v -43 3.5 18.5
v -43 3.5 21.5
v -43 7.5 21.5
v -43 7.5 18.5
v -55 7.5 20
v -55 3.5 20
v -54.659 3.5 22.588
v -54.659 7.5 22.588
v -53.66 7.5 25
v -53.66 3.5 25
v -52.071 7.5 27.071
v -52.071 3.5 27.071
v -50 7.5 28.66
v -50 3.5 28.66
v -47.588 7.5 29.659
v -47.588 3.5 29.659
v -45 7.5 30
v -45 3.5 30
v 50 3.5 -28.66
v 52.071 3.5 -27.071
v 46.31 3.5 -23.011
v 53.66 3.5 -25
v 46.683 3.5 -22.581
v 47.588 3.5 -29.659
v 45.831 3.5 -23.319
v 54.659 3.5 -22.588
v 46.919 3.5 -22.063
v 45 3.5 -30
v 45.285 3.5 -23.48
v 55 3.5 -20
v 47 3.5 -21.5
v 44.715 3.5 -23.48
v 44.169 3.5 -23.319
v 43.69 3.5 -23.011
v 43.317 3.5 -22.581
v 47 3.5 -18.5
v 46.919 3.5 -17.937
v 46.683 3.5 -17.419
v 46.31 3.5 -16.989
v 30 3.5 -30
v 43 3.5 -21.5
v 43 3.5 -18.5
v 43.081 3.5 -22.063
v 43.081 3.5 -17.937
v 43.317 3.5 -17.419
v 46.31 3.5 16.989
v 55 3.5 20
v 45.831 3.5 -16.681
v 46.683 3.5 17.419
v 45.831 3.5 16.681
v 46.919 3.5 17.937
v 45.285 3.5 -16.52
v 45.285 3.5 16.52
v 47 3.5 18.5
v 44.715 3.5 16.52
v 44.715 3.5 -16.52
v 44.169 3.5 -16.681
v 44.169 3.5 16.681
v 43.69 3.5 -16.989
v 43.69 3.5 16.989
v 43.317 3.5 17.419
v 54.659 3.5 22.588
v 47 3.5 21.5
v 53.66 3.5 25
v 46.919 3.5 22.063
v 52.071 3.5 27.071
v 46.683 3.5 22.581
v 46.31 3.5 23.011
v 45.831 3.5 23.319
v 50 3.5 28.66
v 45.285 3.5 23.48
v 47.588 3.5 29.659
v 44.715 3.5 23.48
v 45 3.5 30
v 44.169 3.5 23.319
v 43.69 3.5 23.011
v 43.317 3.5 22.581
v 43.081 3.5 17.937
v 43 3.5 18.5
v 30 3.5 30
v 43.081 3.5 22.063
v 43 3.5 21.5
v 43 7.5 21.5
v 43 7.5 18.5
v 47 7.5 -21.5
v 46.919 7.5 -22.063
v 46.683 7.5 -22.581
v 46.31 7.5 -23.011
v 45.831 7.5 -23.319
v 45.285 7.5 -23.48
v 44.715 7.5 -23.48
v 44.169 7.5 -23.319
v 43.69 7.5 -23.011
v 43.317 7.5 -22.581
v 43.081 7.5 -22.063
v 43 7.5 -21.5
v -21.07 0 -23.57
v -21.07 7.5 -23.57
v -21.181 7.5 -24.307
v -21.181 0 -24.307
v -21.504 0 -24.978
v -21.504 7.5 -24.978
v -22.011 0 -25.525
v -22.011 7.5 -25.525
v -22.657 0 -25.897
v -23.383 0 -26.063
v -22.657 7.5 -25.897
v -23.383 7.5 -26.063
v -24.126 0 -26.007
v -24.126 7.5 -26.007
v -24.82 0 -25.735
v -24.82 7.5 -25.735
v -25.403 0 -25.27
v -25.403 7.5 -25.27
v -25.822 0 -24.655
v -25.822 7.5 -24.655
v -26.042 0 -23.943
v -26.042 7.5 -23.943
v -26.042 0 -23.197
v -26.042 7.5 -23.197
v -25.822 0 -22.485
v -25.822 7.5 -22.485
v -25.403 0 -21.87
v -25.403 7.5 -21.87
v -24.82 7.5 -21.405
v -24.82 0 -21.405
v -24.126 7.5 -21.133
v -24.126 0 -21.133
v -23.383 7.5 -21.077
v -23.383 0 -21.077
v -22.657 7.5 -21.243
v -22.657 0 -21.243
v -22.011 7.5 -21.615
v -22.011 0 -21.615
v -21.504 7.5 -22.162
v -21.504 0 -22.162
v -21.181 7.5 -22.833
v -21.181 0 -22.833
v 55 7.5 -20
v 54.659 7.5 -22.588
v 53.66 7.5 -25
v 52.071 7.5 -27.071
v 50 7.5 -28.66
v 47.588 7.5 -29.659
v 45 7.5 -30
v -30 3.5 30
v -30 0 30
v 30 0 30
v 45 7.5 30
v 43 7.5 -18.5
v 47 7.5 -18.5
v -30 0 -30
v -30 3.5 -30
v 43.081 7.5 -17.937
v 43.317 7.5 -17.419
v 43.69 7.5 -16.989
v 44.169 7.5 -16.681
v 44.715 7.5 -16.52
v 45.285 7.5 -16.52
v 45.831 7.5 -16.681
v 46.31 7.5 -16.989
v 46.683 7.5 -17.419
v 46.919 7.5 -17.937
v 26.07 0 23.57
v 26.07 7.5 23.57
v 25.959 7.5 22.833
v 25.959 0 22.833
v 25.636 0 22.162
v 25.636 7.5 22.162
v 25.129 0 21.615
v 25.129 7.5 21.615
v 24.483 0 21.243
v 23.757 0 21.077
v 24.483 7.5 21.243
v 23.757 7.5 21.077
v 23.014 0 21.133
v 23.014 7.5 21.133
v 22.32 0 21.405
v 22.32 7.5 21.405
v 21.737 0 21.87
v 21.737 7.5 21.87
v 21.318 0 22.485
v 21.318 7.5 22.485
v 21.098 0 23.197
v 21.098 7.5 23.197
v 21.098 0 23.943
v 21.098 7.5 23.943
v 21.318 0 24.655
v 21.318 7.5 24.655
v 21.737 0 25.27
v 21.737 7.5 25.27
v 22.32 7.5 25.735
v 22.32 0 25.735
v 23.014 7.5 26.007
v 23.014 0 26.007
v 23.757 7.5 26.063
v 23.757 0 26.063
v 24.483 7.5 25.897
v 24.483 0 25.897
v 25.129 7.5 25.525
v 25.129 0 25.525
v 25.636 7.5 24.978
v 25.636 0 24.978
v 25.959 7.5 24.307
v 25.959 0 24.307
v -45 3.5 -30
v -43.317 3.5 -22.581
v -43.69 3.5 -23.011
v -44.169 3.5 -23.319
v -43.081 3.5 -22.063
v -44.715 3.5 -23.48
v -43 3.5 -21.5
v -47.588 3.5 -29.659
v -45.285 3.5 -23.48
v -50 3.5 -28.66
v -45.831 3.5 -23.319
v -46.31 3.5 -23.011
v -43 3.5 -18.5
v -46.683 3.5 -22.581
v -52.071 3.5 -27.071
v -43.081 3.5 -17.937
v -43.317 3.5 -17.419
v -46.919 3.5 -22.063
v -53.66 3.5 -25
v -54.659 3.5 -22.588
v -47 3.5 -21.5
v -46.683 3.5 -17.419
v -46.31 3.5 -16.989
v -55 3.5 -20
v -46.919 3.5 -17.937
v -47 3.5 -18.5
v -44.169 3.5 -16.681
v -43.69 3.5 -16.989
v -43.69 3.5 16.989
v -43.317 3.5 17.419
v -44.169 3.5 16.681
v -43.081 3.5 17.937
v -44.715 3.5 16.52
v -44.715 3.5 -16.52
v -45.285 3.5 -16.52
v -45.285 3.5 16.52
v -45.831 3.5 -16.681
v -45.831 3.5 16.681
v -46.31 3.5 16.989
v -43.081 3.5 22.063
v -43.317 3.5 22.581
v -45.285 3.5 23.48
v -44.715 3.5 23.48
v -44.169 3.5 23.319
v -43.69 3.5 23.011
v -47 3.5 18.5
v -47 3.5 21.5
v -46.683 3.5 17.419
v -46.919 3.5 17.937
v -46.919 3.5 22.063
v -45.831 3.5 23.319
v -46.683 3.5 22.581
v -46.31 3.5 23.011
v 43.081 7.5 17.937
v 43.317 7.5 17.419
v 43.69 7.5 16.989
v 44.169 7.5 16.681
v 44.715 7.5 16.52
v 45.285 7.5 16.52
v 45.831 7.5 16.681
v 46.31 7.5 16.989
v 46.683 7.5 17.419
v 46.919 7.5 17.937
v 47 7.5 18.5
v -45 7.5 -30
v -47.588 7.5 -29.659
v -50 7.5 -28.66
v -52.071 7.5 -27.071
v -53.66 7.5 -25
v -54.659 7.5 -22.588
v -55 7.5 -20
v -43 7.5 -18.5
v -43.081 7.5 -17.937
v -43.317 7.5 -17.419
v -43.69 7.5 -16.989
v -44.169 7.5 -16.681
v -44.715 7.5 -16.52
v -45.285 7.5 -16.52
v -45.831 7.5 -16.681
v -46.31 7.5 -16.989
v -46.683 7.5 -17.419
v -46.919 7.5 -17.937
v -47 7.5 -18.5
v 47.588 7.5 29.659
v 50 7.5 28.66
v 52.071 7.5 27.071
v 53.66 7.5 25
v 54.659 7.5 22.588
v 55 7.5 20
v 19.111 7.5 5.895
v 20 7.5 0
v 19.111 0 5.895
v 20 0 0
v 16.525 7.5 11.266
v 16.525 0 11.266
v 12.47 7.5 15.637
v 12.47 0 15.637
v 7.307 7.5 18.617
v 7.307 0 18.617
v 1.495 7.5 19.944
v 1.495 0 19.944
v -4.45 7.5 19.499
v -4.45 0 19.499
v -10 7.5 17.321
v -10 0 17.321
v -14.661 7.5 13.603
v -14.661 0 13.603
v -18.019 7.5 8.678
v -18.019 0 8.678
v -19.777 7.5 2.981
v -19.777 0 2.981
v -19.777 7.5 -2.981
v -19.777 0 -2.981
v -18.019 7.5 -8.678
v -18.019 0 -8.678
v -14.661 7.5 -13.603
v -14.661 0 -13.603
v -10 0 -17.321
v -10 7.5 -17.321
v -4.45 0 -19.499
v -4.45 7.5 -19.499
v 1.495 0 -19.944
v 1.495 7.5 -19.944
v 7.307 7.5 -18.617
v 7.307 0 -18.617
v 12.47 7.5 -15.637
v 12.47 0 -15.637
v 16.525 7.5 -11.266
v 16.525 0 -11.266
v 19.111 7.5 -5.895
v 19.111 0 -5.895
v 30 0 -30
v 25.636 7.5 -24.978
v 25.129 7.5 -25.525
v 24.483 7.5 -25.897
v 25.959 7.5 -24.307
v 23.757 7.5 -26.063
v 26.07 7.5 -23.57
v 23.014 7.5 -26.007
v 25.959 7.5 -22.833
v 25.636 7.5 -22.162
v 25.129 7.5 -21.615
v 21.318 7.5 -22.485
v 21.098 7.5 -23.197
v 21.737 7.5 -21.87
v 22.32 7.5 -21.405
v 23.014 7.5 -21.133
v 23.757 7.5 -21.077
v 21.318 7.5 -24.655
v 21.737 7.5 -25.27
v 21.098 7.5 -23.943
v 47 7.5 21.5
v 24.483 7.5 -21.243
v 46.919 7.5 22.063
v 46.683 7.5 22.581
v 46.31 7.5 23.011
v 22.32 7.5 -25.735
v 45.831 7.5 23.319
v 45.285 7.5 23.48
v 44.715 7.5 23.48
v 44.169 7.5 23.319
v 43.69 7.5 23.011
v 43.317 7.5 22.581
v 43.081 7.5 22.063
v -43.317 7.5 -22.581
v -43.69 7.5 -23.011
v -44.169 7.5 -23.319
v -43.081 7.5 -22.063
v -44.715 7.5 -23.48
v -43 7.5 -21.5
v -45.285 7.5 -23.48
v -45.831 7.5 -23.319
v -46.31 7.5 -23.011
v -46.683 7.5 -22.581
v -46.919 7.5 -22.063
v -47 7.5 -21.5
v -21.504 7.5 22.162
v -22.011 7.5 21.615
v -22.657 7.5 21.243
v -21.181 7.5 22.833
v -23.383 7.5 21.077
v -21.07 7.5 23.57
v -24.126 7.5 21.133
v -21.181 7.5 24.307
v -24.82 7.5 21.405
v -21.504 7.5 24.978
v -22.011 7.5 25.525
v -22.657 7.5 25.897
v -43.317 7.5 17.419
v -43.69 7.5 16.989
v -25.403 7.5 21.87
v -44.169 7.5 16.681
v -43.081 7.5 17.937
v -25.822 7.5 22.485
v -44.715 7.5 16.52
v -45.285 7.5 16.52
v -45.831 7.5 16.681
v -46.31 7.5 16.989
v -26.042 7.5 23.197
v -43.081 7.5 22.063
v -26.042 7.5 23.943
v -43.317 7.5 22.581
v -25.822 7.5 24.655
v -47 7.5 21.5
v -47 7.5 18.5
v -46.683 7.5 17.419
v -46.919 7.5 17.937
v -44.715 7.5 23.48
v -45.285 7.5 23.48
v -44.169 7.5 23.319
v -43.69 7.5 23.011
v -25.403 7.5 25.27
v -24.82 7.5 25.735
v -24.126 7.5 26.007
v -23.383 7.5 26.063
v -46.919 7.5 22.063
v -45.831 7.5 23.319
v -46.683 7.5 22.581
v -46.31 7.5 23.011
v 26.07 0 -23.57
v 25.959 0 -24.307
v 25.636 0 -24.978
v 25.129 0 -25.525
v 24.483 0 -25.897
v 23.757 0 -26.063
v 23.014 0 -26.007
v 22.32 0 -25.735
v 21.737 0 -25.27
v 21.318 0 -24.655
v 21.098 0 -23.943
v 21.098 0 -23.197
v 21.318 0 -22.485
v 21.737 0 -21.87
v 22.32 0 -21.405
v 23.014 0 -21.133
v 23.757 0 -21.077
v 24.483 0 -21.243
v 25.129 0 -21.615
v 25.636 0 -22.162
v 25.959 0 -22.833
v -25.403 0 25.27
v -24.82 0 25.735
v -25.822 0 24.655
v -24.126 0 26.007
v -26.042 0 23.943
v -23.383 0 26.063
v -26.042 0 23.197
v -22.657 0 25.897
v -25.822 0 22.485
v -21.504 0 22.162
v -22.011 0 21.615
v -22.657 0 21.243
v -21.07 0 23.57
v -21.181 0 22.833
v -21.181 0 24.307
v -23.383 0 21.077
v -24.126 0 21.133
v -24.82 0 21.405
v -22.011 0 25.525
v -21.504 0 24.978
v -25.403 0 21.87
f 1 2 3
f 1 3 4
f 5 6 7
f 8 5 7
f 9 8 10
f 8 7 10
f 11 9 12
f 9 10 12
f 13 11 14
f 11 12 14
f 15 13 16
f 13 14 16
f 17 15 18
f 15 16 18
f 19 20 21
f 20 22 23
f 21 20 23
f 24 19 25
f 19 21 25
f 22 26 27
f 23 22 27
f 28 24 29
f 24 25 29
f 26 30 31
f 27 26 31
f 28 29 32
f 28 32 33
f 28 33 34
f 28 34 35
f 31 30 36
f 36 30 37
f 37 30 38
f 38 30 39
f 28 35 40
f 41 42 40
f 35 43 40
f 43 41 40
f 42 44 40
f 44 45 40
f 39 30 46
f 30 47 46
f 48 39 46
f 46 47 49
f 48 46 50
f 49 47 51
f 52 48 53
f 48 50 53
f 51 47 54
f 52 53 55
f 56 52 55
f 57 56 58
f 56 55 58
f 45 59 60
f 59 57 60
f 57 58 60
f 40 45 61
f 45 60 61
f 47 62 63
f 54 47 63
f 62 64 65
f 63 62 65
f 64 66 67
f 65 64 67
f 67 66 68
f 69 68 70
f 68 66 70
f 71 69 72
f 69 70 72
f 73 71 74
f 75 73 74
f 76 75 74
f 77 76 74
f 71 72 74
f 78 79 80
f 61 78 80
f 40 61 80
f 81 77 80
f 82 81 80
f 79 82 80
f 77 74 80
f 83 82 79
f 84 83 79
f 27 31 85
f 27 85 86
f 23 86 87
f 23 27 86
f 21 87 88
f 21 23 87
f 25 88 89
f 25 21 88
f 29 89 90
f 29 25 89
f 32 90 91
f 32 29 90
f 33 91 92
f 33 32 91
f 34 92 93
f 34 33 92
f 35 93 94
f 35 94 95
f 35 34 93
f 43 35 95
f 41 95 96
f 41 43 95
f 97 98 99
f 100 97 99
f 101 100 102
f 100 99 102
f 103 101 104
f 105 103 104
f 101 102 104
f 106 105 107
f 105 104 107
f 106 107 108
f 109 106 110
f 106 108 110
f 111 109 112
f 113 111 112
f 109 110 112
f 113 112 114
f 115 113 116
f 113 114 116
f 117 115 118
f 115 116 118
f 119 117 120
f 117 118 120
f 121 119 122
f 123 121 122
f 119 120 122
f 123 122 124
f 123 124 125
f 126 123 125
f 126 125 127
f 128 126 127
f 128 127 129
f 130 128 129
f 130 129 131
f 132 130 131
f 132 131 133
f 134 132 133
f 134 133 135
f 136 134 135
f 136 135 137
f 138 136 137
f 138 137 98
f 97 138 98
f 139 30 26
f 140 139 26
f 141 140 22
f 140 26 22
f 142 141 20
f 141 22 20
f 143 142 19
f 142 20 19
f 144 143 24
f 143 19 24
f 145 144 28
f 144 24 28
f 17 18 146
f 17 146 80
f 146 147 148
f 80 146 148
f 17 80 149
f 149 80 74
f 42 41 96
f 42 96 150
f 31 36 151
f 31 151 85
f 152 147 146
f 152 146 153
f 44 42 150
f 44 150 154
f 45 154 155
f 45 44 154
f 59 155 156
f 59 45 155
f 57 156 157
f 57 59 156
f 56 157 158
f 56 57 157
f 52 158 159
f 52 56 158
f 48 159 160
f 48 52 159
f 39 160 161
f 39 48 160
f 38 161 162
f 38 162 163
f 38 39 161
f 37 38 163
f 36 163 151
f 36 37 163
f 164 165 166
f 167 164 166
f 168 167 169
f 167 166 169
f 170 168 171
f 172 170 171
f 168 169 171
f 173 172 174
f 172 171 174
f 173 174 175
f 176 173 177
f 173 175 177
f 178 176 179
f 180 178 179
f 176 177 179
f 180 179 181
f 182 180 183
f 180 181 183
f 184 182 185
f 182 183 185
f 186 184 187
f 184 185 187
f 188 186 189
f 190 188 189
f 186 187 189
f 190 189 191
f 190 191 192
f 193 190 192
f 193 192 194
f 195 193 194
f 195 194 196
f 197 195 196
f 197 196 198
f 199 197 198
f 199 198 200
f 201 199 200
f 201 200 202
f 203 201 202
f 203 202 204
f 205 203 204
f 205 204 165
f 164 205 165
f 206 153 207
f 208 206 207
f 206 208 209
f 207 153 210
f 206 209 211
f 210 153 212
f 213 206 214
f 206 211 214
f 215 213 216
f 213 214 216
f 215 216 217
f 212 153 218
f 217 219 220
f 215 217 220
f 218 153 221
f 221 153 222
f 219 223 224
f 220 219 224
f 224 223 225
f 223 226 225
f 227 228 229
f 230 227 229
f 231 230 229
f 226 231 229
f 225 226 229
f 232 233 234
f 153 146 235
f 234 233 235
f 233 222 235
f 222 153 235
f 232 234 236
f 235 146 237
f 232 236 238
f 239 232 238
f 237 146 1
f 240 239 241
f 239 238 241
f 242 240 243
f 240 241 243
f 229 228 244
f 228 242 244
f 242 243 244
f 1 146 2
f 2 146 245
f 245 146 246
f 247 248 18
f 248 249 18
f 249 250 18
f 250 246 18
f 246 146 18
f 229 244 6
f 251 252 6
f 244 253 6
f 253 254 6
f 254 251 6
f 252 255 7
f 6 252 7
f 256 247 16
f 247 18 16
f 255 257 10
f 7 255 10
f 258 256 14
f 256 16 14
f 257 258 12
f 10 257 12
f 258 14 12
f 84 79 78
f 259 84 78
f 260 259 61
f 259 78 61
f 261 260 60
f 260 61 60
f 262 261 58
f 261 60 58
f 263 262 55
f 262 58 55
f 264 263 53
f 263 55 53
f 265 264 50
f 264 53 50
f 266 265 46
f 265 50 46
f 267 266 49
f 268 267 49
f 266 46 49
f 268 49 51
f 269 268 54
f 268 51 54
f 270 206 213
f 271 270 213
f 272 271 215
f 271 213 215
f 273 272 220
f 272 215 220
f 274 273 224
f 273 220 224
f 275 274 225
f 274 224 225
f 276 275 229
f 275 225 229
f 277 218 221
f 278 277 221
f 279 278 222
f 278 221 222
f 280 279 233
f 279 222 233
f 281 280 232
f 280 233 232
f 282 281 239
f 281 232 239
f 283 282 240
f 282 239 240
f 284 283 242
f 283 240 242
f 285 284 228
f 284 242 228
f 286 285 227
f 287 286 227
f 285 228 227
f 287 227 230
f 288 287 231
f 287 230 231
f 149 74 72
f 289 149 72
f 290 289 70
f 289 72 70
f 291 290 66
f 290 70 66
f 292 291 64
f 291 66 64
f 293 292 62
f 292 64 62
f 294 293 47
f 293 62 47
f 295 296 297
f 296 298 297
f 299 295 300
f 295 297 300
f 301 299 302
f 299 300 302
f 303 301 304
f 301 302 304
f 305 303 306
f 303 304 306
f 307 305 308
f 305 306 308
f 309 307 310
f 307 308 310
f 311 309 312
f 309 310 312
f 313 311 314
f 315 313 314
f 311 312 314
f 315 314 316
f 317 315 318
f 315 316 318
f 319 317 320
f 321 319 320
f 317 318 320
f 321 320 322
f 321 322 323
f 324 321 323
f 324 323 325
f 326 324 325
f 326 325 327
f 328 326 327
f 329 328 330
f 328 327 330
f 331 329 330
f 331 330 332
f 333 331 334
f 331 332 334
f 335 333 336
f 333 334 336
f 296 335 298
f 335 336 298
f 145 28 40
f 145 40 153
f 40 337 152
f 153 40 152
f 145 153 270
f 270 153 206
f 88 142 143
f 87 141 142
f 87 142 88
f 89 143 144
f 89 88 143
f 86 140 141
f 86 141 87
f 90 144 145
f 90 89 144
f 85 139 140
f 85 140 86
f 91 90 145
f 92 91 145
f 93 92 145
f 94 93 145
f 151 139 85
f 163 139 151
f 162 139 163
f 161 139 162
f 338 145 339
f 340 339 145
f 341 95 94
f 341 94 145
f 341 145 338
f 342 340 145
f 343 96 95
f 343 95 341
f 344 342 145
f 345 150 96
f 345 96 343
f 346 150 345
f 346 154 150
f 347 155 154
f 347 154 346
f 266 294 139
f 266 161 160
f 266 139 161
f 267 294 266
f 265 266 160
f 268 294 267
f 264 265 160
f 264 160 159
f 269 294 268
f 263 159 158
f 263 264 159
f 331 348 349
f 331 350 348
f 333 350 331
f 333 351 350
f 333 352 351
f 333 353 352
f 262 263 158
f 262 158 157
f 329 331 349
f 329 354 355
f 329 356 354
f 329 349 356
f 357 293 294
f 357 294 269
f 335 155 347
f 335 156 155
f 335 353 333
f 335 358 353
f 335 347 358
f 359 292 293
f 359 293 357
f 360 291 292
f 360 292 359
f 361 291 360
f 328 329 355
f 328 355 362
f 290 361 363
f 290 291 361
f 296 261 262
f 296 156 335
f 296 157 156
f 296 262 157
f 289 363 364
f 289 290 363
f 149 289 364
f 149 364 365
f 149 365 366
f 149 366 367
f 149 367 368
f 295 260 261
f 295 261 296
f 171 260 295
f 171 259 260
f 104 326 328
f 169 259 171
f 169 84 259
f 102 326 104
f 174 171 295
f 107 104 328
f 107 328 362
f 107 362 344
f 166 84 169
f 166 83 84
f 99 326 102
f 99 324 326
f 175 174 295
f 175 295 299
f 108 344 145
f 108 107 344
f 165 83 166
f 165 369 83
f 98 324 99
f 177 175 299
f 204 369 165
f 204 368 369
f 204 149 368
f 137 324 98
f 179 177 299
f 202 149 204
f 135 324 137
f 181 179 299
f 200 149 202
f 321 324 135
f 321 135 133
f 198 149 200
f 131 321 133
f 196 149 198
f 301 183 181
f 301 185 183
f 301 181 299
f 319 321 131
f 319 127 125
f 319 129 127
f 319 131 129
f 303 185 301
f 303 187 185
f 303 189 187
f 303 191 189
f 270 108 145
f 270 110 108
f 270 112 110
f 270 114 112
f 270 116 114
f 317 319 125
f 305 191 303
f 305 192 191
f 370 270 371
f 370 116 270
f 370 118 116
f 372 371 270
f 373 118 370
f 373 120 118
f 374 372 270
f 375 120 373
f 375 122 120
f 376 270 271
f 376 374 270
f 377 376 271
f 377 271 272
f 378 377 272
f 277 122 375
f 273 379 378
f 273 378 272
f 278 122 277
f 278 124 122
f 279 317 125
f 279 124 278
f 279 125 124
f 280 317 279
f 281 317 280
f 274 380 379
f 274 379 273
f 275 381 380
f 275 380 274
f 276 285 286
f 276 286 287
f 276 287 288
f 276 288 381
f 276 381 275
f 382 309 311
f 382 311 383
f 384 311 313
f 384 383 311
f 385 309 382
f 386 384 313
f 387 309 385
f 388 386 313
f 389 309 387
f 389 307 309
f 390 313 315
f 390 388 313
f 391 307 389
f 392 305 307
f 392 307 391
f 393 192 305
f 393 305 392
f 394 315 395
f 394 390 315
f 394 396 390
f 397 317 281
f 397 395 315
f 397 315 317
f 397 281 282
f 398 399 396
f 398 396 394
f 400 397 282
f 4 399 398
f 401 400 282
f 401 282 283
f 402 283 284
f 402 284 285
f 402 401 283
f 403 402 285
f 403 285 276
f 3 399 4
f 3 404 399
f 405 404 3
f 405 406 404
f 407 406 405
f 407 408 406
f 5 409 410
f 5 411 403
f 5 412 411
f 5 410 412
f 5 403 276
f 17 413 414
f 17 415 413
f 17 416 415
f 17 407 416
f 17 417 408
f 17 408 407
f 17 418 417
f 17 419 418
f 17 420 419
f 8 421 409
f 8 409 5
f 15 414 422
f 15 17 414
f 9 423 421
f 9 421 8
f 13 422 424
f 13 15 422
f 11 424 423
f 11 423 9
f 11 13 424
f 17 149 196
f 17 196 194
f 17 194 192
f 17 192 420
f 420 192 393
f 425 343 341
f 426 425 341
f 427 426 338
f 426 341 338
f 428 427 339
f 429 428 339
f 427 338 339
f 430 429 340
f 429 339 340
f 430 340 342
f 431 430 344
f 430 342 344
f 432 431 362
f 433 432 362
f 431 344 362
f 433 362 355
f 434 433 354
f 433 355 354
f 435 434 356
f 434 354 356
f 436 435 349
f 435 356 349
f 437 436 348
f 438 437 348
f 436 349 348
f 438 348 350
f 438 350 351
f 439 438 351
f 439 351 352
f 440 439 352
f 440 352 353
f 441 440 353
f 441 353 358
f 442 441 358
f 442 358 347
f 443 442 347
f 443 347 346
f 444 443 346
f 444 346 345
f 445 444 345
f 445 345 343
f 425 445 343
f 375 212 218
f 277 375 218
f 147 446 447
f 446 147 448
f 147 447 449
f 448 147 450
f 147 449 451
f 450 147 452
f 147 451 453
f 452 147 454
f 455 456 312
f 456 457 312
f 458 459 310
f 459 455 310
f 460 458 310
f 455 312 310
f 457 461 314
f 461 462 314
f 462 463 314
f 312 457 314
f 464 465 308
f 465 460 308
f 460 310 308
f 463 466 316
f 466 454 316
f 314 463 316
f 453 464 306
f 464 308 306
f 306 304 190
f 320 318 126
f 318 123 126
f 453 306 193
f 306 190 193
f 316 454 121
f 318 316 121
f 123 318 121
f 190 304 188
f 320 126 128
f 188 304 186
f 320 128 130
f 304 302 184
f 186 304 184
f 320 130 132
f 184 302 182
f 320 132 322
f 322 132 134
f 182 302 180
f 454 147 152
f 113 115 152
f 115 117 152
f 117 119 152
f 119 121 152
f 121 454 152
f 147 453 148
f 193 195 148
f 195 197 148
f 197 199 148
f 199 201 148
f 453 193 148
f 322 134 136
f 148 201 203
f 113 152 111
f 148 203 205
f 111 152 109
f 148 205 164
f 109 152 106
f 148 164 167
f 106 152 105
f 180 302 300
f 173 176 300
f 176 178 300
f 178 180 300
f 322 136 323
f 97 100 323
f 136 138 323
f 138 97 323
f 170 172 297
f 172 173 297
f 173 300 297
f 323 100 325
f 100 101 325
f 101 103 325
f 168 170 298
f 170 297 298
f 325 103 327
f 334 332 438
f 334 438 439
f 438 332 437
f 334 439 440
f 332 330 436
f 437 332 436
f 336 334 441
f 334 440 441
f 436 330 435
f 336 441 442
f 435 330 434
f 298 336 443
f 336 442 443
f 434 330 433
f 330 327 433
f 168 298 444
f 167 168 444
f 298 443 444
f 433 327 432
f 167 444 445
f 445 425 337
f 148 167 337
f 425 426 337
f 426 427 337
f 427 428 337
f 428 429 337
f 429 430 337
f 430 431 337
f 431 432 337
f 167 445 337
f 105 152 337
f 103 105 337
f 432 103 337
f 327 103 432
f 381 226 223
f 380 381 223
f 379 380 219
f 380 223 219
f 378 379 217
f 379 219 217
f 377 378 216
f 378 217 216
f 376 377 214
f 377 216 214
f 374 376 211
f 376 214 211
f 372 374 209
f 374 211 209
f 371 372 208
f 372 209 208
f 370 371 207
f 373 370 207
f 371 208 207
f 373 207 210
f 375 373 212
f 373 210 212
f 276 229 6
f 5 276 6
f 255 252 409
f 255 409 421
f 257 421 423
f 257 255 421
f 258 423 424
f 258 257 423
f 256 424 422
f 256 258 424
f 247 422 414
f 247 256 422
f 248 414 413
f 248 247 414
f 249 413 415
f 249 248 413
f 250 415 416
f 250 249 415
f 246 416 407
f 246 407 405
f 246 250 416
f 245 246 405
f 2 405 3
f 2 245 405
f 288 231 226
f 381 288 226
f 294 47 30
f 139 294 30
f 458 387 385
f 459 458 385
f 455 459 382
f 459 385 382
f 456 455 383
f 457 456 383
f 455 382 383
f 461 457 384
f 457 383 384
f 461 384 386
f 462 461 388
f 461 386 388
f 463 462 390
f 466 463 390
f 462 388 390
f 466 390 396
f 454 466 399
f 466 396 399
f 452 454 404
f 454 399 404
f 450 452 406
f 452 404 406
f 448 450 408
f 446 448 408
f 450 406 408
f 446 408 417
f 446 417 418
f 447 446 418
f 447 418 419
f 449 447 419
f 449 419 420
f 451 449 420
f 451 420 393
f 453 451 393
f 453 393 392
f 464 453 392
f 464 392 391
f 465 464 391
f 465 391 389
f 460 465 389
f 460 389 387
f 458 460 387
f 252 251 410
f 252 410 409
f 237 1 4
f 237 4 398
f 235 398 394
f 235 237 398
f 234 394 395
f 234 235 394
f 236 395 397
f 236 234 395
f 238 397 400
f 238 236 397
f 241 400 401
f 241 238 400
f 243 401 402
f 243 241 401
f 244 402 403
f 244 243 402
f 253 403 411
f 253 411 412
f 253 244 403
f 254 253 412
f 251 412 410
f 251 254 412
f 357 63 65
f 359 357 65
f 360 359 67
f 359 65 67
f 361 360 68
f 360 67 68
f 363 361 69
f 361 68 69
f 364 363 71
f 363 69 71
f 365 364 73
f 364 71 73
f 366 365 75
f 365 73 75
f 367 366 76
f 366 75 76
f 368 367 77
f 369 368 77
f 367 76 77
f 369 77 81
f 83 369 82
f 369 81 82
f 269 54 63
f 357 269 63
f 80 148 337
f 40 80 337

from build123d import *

# Parameters (mm, degrees)
SKETCH1_W                    = 60
SKETCH1_H                    = 60
SKETCH1_R                    = 20
BOSS_EXTRUDE1_DEPTH          = 3.5
SKETCH2_R                    = 20
BOSS_EXTRUDE2_DEPTH          = 4
F_5_0_5_DIAMETER_HOLE1_D     = 5
F_5_0_5_DIAMETER_HOLE1_DEPTH = 25
F_5_0_5_DIAMETER_HOLE1_TIP   = 1.502151548


with BuildPart() as part:
    # Sketch1 → Boss-Extrude1 (new body)
    with BuildSketch(Plane(origin=(0, 0, 0), x_dir=(1, 0, 0), z_dir=(0, 1, 0))):
        Rectangle(SKETCH1_W, SKETCH1_H)
        Circle(SKETCH1_R, mode=Mode.SUBTRACT)
    extrude(amount=BOSS_EXTRUDE1_DEPTH)

    # Sketch2 → Boss-Extrude2 (add)
    with BuildSketch(Plane(origin=(0, 3.5, -3.5), x_dir=(1, 0, 0), z_dir=(0, -1, 0))):
        with BuildLine():
            Line((45, -26.5), (-45, -26.5))
            ThreePointArc((-45, -26.5), (-52.071067812, -23.571067812), (-55, -16.5))
            Line((-55, -16.5), (-55, 23.5))
            ThreePointArc((-55, 23.5), (-52.071067812, 30.571067812), (-45, 33.5))
            Line((-45, 33.5), (45, 33.5))
            ThreePointArc((45, 33.5), (52.071067812, 30.571067812), (55, 23.5))
            Line((55, 23.5), (55, -16.5))
            ThreePointArc((55, -16.5), (52.071067812, -23.571067812), (45, -26.5))
        make_face()
        with Locations((0, 3.5)):
            Circle(SKETCH2_R, mode=Mode.SUBTRACT)
        with BuildLine():
            Line((-47, -15), (-47, -18))
            ThreePointArc((-47, -18), (-45, -20), (-43, -18))
            Line((-43, -18), (-43, -15))
            ThreePointArc((-43, -15), (-45, -13), (-47, -15))
        make_face(mode=Mode.SUBTRACT)
        with BuildLine():
            Line((-43, 25), (-43, 22))
            ThreePointArc((-43, 22), (-45, 20), (-47, 22))
            Line((-47, 22), (-47, 25))
            ThreePointArc((-47, 25), (-45, 27), (-43, 25))
        make_face(mode=Mode.SUBTRACT)
        with BuildLine():
            Line((43, -18), (43, -15))
            ThreePointArc((43, -15), (45, -13), (47, -15))
            Line((47, -15), (47, -18))
            ThreePointArc((47, -18), (45, -20), (43, -18))
        make_face(mode=Mode.SUBTRACT)
        with BuildLine():
            Line((47, 22), (47, 25))
            ThreePointArc((47, 25), (45, 27), (43, 25))
            Line((43, 25), (43, 22))
            ThreePointArc((43, 22), (45, 20), (47, 22))
        make_face(mode=Mode.SUBTRACT)
    extrude(amount=-BOSS_EXTRUDE2_DEPTH)

    # Ø5.0 (5) Diameter Hole1
    with Locations(Plane(origin=(233.298234679, 0, -449.602484579), x_dir=(-1, 0, 0), z_dir=(0, -1, 0))):
        with Locations((256.868234679, -473.172484579), (209.728234679, -473.172484579), (209.728234679, -426.032484579), (256.868234679, -426.032484579)):
            Hole(F_5_0_5_DIAMETER_HOLE1_D / 2, depth=F_5_0_5_DIAMETER_HOLE1_DEPTH)
            with Locations((0, 0, -(F_5_0_5_DIAMETER_HOLE1_DEPTH + F_5_0_5_DIAMETER_HOLE1_TIP / 2))):  # 118° drill point
                Cone(0, F_5_0_5_DIAMETER_HOLE1_D / 2, F_5_0_5_DIAMETER_HOLE1_TIP, mode=Mode.SUBTRACT)


solid = part.part
